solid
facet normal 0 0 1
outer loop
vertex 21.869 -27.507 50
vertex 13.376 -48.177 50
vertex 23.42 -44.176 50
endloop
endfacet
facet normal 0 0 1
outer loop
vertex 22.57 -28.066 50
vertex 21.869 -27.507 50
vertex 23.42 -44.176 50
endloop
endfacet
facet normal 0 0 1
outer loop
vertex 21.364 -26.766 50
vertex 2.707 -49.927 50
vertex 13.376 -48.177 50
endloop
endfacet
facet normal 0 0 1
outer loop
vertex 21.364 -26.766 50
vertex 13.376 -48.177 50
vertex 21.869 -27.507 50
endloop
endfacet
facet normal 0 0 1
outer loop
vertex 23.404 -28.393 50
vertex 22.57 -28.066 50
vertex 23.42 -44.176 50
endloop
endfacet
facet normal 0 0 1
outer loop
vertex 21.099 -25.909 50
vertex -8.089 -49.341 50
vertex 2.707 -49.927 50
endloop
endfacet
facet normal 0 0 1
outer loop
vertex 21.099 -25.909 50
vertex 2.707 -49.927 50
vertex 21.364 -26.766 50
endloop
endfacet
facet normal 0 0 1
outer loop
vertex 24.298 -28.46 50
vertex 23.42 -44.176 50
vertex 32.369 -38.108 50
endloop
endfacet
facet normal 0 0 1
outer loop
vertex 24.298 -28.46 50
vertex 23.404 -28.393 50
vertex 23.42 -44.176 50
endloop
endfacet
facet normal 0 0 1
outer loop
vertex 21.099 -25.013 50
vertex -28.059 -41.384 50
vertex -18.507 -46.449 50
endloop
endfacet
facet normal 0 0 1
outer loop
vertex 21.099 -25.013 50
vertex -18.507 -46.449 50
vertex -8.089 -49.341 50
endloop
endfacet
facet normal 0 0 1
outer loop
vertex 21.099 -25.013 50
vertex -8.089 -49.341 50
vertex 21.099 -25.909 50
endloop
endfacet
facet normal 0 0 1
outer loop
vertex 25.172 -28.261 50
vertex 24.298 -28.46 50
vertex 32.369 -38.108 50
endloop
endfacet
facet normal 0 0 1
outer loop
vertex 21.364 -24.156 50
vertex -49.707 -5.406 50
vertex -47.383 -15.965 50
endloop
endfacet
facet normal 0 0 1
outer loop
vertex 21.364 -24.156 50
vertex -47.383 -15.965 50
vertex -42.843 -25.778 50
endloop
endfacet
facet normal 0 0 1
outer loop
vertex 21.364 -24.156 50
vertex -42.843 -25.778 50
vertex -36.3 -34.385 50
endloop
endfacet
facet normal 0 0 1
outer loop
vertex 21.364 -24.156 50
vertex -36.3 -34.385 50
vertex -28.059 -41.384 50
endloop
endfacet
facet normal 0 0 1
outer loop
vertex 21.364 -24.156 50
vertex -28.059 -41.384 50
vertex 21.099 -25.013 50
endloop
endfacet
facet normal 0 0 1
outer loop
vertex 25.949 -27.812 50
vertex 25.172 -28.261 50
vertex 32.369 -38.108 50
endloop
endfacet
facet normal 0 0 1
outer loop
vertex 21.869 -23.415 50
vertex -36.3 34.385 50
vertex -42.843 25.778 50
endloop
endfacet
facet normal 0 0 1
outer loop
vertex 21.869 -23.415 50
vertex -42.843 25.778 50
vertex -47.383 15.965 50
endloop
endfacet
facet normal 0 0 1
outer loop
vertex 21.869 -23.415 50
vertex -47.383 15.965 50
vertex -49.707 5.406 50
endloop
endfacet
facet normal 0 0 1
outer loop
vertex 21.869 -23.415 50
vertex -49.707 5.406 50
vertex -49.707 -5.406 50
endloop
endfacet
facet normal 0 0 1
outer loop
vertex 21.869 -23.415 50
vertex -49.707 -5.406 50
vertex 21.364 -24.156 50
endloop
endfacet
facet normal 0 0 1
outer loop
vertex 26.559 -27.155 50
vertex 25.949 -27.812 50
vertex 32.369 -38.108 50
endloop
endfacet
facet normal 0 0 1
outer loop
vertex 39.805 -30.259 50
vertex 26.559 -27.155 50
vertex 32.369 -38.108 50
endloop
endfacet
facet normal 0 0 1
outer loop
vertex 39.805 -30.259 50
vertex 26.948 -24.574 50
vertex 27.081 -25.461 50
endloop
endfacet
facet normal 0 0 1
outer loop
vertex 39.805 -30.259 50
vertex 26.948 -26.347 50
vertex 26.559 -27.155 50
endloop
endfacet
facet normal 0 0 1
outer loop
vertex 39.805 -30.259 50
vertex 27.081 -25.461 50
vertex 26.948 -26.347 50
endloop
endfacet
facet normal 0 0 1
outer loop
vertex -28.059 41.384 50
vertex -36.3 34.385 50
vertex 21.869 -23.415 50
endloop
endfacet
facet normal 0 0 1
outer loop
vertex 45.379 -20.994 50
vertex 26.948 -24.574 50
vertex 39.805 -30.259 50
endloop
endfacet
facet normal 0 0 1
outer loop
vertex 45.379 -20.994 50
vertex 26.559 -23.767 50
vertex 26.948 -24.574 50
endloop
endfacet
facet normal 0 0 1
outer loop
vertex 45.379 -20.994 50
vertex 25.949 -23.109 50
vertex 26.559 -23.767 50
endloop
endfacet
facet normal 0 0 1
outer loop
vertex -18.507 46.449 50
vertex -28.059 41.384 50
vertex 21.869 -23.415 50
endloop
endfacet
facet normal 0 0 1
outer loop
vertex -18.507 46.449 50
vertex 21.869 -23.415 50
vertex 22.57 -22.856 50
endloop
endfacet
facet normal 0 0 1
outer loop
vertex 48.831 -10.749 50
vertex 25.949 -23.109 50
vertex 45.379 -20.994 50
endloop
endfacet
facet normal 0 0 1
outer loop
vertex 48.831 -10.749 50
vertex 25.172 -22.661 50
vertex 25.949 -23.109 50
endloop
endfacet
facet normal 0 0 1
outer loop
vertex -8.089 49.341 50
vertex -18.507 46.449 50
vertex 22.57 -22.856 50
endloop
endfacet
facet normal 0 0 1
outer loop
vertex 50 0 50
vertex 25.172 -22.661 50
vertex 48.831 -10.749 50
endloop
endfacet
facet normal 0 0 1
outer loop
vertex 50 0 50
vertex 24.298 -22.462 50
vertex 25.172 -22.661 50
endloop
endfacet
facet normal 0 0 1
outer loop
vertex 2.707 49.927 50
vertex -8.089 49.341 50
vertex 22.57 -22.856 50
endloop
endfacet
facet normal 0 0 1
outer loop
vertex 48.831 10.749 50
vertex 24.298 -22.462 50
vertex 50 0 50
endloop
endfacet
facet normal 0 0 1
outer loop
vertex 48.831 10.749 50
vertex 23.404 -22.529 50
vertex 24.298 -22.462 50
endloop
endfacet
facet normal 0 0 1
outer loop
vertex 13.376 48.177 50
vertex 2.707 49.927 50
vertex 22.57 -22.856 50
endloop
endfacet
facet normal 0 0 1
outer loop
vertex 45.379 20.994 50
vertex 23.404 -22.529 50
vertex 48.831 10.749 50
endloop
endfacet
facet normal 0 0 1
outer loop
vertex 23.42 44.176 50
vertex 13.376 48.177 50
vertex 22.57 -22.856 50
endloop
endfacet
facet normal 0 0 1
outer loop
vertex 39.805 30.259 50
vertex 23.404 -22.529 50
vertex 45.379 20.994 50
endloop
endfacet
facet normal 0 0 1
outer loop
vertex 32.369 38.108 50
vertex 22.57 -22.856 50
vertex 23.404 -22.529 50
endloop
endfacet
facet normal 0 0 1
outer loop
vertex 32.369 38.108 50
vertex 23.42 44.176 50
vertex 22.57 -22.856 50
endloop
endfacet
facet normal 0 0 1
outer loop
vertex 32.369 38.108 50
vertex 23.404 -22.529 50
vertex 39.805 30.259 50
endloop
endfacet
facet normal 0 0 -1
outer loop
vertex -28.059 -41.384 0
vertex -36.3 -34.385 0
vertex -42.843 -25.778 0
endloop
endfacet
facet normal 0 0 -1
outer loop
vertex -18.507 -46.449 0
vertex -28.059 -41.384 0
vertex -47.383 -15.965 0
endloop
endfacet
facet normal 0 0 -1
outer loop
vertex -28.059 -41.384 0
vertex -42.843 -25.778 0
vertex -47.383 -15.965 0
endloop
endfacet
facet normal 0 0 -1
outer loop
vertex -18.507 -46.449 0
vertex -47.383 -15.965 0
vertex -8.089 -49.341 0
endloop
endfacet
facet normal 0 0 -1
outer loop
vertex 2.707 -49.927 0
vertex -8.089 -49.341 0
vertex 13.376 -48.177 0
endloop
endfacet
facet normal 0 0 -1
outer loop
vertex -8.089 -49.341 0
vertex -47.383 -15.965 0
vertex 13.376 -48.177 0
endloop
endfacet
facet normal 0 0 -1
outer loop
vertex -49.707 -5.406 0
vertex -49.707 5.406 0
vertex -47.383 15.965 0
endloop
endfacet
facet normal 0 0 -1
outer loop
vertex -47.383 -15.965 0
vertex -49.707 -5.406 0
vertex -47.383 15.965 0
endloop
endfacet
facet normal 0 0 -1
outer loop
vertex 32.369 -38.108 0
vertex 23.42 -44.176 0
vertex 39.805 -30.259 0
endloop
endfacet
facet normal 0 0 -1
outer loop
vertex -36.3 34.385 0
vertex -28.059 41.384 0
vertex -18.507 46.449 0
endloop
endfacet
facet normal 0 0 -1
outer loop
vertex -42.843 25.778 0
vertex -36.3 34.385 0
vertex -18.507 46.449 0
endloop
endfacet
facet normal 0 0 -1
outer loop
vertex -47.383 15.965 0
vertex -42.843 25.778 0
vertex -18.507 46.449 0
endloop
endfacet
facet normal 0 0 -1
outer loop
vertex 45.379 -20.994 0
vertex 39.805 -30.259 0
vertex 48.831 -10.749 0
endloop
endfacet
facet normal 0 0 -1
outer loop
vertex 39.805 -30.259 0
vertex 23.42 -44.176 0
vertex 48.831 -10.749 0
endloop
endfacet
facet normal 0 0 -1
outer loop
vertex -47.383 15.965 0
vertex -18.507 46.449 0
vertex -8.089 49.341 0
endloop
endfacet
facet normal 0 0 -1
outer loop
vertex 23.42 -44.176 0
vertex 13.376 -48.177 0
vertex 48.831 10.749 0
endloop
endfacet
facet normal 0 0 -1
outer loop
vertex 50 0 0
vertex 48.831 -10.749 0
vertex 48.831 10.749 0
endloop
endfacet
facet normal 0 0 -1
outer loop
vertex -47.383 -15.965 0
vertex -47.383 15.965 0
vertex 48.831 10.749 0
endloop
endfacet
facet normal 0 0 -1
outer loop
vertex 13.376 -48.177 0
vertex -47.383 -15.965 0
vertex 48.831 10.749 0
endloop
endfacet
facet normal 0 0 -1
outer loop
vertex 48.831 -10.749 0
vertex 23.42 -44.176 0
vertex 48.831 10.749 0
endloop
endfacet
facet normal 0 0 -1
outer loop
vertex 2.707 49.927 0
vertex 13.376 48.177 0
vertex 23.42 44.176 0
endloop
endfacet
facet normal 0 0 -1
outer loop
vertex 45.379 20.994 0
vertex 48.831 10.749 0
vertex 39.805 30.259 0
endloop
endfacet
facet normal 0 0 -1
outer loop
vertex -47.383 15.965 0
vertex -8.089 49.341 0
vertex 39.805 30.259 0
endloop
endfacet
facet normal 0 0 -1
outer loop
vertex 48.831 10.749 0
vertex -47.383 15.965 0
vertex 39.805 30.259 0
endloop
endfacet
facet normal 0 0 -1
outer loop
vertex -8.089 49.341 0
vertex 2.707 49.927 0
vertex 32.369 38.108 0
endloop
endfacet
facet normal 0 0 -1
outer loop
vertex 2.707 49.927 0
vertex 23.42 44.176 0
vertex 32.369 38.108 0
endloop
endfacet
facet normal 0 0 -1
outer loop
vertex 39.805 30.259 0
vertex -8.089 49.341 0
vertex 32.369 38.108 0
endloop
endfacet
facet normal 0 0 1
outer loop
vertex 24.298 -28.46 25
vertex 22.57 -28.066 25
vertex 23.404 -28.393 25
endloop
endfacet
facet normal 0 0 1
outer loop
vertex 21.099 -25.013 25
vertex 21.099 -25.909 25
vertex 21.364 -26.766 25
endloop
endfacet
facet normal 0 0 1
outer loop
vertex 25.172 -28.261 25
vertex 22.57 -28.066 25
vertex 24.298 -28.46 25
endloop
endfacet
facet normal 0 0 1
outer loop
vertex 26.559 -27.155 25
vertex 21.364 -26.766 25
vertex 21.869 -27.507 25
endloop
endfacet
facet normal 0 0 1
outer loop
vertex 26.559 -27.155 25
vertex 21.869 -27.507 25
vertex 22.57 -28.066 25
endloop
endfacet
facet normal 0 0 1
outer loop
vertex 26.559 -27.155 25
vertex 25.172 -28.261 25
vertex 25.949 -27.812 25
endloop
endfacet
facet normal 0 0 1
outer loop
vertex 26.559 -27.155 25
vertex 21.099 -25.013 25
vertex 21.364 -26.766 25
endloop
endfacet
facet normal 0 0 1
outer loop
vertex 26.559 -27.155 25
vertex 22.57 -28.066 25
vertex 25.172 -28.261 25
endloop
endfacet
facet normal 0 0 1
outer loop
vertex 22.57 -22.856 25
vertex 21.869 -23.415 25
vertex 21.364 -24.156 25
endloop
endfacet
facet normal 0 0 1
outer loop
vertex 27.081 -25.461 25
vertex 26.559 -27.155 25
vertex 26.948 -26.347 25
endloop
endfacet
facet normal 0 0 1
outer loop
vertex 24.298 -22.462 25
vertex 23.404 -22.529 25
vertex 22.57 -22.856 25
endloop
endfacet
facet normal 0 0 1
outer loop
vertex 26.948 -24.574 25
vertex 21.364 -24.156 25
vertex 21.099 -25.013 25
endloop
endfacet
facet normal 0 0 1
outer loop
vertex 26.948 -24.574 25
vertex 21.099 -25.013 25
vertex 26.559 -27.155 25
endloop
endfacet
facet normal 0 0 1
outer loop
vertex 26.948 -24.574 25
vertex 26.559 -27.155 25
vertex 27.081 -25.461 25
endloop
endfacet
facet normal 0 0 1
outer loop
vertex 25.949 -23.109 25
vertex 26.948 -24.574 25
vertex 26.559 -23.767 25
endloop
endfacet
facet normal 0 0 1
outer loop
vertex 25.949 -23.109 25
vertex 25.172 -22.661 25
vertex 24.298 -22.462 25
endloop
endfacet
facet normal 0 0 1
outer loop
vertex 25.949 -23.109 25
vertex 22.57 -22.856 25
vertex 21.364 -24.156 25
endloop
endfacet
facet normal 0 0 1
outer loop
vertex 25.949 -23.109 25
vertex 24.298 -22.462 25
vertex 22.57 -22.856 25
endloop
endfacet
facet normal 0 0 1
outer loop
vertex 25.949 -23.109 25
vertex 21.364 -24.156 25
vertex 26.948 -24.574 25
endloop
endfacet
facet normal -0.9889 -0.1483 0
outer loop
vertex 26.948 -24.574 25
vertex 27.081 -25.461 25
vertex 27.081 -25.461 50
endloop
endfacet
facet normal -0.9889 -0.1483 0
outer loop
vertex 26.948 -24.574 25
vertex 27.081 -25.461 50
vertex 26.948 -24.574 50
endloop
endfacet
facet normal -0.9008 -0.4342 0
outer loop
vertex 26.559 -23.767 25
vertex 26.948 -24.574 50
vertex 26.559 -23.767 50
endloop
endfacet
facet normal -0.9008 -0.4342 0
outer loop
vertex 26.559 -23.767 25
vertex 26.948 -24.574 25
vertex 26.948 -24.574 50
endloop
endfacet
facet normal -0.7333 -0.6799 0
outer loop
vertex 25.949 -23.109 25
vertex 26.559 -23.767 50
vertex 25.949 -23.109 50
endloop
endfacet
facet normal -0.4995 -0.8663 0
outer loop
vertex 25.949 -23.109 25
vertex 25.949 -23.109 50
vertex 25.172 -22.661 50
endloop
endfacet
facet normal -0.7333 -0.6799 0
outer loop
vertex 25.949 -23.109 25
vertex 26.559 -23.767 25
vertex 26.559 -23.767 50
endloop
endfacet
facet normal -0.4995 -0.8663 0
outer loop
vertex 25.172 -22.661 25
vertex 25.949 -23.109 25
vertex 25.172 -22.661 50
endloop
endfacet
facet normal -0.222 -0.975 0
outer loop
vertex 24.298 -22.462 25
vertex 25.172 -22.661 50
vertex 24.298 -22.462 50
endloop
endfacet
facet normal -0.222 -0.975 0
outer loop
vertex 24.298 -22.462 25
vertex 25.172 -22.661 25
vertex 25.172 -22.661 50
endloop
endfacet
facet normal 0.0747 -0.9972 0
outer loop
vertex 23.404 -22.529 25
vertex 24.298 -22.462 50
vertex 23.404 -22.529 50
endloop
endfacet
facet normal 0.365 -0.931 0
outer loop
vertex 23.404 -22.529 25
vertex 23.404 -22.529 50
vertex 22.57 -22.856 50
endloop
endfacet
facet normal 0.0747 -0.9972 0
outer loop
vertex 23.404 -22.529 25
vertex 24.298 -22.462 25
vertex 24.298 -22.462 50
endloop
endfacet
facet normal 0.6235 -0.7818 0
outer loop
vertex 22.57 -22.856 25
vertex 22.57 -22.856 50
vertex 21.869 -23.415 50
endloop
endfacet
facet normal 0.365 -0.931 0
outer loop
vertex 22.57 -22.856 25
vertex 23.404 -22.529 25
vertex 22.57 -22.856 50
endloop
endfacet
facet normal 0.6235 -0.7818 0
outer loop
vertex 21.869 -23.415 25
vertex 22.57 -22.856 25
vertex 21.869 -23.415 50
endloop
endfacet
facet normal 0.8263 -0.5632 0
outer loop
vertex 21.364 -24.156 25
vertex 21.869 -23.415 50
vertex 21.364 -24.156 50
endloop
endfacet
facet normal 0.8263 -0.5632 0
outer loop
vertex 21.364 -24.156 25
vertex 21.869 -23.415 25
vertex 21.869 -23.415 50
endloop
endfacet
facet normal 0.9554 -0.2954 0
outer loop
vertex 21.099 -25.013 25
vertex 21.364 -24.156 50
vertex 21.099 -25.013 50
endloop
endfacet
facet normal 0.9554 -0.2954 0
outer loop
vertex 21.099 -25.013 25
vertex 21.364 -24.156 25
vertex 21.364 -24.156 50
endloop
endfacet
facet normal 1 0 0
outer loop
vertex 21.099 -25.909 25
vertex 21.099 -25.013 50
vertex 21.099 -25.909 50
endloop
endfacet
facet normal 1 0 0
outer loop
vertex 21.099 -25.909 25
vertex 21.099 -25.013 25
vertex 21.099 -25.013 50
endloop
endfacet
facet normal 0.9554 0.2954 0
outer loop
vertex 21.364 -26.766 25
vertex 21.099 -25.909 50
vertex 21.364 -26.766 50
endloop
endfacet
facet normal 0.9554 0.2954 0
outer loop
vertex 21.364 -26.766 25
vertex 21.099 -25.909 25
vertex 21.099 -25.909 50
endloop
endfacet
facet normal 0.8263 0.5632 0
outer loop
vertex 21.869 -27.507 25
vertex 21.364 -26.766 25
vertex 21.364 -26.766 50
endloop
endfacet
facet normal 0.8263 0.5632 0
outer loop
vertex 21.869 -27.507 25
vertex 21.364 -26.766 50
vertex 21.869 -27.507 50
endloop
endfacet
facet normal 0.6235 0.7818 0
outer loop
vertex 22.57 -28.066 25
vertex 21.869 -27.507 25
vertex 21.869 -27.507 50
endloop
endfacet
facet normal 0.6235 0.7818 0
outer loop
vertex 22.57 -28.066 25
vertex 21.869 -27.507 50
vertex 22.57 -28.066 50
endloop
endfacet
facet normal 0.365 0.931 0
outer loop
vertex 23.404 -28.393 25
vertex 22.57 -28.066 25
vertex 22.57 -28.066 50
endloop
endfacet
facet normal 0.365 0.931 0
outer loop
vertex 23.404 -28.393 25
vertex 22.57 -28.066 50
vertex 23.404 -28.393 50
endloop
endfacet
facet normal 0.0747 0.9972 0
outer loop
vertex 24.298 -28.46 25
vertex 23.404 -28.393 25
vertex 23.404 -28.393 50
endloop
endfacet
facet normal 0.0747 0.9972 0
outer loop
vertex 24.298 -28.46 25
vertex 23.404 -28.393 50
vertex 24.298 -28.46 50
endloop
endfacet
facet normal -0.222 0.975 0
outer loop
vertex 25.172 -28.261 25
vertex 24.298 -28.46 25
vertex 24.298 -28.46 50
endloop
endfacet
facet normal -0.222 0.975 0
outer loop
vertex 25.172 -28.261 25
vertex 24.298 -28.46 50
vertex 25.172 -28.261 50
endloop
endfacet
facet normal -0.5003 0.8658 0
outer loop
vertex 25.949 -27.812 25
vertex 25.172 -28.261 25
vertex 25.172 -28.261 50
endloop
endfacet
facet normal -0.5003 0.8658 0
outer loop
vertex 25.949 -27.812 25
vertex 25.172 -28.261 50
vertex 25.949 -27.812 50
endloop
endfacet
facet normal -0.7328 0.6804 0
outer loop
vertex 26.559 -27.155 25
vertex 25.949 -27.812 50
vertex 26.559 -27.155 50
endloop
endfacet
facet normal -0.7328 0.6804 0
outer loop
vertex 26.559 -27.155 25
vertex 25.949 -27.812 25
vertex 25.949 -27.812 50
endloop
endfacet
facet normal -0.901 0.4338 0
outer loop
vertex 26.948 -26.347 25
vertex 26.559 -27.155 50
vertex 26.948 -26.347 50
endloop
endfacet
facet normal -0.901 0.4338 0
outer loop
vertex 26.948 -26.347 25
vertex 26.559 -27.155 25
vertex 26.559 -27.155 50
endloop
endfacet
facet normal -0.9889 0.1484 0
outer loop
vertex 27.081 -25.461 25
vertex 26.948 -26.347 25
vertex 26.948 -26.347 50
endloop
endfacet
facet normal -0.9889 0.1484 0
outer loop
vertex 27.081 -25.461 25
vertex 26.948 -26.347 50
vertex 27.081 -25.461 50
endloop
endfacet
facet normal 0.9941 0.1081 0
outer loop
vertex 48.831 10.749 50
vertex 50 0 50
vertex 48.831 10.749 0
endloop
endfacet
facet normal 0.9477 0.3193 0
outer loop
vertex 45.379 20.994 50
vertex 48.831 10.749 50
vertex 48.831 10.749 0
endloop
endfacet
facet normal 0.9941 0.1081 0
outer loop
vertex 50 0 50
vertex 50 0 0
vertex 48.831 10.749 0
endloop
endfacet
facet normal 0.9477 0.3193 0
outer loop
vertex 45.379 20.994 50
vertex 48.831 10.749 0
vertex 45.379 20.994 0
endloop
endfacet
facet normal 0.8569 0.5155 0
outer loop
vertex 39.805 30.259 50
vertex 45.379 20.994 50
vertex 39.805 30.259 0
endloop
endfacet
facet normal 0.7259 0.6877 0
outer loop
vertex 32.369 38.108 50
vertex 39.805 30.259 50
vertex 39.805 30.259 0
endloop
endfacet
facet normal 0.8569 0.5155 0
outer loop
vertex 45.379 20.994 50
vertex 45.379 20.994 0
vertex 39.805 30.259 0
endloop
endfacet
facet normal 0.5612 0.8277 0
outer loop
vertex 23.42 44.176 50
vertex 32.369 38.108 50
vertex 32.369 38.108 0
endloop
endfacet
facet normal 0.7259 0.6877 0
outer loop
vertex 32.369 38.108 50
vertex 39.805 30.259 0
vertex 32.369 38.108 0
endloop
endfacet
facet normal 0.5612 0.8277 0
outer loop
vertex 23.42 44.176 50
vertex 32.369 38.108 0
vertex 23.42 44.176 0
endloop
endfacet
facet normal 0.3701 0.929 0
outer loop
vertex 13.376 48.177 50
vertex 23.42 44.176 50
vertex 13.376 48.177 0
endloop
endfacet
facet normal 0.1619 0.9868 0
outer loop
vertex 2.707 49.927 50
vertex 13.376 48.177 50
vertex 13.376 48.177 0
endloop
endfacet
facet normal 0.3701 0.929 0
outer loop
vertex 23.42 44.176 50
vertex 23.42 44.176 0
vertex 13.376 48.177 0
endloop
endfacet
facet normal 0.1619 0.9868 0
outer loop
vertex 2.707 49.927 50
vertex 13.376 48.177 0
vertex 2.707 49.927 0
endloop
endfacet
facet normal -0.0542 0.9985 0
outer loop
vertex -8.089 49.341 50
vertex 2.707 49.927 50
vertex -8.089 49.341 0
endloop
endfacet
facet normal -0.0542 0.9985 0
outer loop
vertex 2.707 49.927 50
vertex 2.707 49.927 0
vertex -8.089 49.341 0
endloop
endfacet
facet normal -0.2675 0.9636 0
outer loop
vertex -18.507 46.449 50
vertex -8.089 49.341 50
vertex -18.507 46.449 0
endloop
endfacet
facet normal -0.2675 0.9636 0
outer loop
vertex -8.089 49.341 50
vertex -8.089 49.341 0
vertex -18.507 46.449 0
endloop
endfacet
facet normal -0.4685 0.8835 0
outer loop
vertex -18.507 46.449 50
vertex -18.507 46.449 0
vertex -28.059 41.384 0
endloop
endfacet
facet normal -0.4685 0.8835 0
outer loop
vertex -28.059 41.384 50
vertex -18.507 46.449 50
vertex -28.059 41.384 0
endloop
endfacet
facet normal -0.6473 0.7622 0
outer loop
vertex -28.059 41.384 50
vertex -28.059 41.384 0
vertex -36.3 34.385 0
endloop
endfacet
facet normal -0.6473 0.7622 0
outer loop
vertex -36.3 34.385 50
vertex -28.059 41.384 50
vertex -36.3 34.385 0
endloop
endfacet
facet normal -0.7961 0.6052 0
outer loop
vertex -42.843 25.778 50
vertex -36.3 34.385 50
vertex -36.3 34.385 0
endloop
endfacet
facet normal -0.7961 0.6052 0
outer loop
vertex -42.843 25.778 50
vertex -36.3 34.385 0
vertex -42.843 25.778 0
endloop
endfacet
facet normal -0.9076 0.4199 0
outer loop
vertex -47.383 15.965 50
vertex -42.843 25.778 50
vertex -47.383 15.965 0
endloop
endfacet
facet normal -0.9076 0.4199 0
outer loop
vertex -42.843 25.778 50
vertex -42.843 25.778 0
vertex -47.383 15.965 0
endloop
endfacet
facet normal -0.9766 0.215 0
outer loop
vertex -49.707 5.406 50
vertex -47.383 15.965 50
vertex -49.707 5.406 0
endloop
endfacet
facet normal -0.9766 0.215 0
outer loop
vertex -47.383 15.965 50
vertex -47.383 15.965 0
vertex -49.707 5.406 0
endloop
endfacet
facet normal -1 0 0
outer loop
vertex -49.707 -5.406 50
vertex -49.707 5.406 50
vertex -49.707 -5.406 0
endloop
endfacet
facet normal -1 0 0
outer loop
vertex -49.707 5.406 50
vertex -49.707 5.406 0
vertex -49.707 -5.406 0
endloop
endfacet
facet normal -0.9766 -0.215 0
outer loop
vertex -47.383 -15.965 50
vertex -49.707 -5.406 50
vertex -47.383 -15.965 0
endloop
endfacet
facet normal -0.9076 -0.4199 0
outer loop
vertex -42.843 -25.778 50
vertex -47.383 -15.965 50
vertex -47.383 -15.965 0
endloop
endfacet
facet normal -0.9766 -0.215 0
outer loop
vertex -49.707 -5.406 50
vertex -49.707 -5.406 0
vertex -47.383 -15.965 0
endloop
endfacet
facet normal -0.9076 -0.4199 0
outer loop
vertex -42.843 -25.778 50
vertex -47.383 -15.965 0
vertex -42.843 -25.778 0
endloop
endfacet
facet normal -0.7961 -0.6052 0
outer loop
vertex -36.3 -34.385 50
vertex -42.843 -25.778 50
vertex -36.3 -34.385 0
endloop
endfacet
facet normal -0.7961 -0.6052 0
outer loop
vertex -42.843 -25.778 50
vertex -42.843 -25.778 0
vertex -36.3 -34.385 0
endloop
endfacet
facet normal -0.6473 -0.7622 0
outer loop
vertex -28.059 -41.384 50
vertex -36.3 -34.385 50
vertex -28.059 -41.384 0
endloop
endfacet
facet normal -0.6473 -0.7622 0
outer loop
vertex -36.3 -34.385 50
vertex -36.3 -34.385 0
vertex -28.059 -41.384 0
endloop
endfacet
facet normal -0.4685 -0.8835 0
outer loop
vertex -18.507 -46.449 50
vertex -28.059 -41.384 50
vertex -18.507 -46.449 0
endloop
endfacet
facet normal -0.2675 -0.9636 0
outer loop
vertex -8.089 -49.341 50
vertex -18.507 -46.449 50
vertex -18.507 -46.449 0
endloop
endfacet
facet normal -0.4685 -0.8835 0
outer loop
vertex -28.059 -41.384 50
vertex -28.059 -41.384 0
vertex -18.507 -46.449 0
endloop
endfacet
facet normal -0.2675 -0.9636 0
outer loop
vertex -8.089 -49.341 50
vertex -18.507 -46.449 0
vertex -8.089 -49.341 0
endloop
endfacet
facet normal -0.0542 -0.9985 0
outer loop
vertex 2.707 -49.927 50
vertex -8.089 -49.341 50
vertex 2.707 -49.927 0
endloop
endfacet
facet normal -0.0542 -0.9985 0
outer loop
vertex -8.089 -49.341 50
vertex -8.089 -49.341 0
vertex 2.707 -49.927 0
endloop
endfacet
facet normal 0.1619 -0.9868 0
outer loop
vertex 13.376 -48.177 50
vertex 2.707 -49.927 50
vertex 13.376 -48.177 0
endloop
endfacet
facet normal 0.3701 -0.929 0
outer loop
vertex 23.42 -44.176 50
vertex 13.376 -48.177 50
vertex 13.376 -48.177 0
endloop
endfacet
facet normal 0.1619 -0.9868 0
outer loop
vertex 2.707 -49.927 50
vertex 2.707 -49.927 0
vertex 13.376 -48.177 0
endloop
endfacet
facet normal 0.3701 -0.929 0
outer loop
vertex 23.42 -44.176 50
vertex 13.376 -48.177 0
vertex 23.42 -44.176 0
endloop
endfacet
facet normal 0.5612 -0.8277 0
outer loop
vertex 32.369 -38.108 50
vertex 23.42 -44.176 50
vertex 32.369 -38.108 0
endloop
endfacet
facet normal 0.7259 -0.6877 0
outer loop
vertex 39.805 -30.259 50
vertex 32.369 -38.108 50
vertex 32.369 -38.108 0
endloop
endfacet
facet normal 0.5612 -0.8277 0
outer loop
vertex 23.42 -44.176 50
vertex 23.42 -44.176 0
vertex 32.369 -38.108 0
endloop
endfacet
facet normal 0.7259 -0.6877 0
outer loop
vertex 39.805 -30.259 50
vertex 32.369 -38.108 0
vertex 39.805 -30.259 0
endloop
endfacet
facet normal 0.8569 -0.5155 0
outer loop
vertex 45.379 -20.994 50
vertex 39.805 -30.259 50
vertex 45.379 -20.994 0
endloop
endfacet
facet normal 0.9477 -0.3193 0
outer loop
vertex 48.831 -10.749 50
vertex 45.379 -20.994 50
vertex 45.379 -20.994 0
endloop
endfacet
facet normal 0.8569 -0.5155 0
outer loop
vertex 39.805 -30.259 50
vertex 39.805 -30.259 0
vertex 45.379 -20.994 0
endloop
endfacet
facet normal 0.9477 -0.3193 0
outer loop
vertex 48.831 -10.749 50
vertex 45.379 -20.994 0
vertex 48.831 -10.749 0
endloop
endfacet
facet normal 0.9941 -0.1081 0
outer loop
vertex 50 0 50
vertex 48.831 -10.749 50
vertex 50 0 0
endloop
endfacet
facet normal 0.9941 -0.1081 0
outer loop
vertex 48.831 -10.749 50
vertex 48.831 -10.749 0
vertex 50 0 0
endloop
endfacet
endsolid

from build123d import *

# Parameters (mm, degrees)
F0_R     = 50
F1_DEPTH = 25
F3_DEPTH = 25
F4_R     = 50
F4_R_2   = 3.0077087993
F5_DEPTH = 25


with BuildPart() as f1:
    # F0 (on Top) → F1 (new body)
    with BuildSketch(Plane.XY):
        Circle(F0_R)
    extrude(amount=F1_DEPTH)

    # F2 (on face) → F3 (join)
    with BuildSketch(Plane.XY.offset(25)):
        Polygon((-0.9346593793, 23.0941153177), (-20.4674202327, 10.7376188925), (-19.5327608534, -12.3564964252), (0.9346593793, -23.0941153177), (20.4674202327, -10.7376188925), (19.5327608534, 12.3564964252), align=None)
    extrude(amount=F3_DEPTH)

    # F4 (on face) → F5 (join)
    with BuildSketch(Plane.XY.offset(25)):
        Circle(F4_R)
        with Locations((24.0734647959, -25.4608131945)):
            Circle(F4_R_2, mode=Mode.SUBTRACT)
        Polygon((-0.9346593793, 23.0941153177), (19.5327608534, 12.3564964252), (20.4674202327, -10.7376188925), (0.9346593793, -23.0941153177), (-19.5327608534, -12.3564964252), (-20.4674202327, 10.7376188925), align=None, mode=Mode.SUBTRACT)
    extrude(amount=F5_DEPTH)


solid = f1.part
